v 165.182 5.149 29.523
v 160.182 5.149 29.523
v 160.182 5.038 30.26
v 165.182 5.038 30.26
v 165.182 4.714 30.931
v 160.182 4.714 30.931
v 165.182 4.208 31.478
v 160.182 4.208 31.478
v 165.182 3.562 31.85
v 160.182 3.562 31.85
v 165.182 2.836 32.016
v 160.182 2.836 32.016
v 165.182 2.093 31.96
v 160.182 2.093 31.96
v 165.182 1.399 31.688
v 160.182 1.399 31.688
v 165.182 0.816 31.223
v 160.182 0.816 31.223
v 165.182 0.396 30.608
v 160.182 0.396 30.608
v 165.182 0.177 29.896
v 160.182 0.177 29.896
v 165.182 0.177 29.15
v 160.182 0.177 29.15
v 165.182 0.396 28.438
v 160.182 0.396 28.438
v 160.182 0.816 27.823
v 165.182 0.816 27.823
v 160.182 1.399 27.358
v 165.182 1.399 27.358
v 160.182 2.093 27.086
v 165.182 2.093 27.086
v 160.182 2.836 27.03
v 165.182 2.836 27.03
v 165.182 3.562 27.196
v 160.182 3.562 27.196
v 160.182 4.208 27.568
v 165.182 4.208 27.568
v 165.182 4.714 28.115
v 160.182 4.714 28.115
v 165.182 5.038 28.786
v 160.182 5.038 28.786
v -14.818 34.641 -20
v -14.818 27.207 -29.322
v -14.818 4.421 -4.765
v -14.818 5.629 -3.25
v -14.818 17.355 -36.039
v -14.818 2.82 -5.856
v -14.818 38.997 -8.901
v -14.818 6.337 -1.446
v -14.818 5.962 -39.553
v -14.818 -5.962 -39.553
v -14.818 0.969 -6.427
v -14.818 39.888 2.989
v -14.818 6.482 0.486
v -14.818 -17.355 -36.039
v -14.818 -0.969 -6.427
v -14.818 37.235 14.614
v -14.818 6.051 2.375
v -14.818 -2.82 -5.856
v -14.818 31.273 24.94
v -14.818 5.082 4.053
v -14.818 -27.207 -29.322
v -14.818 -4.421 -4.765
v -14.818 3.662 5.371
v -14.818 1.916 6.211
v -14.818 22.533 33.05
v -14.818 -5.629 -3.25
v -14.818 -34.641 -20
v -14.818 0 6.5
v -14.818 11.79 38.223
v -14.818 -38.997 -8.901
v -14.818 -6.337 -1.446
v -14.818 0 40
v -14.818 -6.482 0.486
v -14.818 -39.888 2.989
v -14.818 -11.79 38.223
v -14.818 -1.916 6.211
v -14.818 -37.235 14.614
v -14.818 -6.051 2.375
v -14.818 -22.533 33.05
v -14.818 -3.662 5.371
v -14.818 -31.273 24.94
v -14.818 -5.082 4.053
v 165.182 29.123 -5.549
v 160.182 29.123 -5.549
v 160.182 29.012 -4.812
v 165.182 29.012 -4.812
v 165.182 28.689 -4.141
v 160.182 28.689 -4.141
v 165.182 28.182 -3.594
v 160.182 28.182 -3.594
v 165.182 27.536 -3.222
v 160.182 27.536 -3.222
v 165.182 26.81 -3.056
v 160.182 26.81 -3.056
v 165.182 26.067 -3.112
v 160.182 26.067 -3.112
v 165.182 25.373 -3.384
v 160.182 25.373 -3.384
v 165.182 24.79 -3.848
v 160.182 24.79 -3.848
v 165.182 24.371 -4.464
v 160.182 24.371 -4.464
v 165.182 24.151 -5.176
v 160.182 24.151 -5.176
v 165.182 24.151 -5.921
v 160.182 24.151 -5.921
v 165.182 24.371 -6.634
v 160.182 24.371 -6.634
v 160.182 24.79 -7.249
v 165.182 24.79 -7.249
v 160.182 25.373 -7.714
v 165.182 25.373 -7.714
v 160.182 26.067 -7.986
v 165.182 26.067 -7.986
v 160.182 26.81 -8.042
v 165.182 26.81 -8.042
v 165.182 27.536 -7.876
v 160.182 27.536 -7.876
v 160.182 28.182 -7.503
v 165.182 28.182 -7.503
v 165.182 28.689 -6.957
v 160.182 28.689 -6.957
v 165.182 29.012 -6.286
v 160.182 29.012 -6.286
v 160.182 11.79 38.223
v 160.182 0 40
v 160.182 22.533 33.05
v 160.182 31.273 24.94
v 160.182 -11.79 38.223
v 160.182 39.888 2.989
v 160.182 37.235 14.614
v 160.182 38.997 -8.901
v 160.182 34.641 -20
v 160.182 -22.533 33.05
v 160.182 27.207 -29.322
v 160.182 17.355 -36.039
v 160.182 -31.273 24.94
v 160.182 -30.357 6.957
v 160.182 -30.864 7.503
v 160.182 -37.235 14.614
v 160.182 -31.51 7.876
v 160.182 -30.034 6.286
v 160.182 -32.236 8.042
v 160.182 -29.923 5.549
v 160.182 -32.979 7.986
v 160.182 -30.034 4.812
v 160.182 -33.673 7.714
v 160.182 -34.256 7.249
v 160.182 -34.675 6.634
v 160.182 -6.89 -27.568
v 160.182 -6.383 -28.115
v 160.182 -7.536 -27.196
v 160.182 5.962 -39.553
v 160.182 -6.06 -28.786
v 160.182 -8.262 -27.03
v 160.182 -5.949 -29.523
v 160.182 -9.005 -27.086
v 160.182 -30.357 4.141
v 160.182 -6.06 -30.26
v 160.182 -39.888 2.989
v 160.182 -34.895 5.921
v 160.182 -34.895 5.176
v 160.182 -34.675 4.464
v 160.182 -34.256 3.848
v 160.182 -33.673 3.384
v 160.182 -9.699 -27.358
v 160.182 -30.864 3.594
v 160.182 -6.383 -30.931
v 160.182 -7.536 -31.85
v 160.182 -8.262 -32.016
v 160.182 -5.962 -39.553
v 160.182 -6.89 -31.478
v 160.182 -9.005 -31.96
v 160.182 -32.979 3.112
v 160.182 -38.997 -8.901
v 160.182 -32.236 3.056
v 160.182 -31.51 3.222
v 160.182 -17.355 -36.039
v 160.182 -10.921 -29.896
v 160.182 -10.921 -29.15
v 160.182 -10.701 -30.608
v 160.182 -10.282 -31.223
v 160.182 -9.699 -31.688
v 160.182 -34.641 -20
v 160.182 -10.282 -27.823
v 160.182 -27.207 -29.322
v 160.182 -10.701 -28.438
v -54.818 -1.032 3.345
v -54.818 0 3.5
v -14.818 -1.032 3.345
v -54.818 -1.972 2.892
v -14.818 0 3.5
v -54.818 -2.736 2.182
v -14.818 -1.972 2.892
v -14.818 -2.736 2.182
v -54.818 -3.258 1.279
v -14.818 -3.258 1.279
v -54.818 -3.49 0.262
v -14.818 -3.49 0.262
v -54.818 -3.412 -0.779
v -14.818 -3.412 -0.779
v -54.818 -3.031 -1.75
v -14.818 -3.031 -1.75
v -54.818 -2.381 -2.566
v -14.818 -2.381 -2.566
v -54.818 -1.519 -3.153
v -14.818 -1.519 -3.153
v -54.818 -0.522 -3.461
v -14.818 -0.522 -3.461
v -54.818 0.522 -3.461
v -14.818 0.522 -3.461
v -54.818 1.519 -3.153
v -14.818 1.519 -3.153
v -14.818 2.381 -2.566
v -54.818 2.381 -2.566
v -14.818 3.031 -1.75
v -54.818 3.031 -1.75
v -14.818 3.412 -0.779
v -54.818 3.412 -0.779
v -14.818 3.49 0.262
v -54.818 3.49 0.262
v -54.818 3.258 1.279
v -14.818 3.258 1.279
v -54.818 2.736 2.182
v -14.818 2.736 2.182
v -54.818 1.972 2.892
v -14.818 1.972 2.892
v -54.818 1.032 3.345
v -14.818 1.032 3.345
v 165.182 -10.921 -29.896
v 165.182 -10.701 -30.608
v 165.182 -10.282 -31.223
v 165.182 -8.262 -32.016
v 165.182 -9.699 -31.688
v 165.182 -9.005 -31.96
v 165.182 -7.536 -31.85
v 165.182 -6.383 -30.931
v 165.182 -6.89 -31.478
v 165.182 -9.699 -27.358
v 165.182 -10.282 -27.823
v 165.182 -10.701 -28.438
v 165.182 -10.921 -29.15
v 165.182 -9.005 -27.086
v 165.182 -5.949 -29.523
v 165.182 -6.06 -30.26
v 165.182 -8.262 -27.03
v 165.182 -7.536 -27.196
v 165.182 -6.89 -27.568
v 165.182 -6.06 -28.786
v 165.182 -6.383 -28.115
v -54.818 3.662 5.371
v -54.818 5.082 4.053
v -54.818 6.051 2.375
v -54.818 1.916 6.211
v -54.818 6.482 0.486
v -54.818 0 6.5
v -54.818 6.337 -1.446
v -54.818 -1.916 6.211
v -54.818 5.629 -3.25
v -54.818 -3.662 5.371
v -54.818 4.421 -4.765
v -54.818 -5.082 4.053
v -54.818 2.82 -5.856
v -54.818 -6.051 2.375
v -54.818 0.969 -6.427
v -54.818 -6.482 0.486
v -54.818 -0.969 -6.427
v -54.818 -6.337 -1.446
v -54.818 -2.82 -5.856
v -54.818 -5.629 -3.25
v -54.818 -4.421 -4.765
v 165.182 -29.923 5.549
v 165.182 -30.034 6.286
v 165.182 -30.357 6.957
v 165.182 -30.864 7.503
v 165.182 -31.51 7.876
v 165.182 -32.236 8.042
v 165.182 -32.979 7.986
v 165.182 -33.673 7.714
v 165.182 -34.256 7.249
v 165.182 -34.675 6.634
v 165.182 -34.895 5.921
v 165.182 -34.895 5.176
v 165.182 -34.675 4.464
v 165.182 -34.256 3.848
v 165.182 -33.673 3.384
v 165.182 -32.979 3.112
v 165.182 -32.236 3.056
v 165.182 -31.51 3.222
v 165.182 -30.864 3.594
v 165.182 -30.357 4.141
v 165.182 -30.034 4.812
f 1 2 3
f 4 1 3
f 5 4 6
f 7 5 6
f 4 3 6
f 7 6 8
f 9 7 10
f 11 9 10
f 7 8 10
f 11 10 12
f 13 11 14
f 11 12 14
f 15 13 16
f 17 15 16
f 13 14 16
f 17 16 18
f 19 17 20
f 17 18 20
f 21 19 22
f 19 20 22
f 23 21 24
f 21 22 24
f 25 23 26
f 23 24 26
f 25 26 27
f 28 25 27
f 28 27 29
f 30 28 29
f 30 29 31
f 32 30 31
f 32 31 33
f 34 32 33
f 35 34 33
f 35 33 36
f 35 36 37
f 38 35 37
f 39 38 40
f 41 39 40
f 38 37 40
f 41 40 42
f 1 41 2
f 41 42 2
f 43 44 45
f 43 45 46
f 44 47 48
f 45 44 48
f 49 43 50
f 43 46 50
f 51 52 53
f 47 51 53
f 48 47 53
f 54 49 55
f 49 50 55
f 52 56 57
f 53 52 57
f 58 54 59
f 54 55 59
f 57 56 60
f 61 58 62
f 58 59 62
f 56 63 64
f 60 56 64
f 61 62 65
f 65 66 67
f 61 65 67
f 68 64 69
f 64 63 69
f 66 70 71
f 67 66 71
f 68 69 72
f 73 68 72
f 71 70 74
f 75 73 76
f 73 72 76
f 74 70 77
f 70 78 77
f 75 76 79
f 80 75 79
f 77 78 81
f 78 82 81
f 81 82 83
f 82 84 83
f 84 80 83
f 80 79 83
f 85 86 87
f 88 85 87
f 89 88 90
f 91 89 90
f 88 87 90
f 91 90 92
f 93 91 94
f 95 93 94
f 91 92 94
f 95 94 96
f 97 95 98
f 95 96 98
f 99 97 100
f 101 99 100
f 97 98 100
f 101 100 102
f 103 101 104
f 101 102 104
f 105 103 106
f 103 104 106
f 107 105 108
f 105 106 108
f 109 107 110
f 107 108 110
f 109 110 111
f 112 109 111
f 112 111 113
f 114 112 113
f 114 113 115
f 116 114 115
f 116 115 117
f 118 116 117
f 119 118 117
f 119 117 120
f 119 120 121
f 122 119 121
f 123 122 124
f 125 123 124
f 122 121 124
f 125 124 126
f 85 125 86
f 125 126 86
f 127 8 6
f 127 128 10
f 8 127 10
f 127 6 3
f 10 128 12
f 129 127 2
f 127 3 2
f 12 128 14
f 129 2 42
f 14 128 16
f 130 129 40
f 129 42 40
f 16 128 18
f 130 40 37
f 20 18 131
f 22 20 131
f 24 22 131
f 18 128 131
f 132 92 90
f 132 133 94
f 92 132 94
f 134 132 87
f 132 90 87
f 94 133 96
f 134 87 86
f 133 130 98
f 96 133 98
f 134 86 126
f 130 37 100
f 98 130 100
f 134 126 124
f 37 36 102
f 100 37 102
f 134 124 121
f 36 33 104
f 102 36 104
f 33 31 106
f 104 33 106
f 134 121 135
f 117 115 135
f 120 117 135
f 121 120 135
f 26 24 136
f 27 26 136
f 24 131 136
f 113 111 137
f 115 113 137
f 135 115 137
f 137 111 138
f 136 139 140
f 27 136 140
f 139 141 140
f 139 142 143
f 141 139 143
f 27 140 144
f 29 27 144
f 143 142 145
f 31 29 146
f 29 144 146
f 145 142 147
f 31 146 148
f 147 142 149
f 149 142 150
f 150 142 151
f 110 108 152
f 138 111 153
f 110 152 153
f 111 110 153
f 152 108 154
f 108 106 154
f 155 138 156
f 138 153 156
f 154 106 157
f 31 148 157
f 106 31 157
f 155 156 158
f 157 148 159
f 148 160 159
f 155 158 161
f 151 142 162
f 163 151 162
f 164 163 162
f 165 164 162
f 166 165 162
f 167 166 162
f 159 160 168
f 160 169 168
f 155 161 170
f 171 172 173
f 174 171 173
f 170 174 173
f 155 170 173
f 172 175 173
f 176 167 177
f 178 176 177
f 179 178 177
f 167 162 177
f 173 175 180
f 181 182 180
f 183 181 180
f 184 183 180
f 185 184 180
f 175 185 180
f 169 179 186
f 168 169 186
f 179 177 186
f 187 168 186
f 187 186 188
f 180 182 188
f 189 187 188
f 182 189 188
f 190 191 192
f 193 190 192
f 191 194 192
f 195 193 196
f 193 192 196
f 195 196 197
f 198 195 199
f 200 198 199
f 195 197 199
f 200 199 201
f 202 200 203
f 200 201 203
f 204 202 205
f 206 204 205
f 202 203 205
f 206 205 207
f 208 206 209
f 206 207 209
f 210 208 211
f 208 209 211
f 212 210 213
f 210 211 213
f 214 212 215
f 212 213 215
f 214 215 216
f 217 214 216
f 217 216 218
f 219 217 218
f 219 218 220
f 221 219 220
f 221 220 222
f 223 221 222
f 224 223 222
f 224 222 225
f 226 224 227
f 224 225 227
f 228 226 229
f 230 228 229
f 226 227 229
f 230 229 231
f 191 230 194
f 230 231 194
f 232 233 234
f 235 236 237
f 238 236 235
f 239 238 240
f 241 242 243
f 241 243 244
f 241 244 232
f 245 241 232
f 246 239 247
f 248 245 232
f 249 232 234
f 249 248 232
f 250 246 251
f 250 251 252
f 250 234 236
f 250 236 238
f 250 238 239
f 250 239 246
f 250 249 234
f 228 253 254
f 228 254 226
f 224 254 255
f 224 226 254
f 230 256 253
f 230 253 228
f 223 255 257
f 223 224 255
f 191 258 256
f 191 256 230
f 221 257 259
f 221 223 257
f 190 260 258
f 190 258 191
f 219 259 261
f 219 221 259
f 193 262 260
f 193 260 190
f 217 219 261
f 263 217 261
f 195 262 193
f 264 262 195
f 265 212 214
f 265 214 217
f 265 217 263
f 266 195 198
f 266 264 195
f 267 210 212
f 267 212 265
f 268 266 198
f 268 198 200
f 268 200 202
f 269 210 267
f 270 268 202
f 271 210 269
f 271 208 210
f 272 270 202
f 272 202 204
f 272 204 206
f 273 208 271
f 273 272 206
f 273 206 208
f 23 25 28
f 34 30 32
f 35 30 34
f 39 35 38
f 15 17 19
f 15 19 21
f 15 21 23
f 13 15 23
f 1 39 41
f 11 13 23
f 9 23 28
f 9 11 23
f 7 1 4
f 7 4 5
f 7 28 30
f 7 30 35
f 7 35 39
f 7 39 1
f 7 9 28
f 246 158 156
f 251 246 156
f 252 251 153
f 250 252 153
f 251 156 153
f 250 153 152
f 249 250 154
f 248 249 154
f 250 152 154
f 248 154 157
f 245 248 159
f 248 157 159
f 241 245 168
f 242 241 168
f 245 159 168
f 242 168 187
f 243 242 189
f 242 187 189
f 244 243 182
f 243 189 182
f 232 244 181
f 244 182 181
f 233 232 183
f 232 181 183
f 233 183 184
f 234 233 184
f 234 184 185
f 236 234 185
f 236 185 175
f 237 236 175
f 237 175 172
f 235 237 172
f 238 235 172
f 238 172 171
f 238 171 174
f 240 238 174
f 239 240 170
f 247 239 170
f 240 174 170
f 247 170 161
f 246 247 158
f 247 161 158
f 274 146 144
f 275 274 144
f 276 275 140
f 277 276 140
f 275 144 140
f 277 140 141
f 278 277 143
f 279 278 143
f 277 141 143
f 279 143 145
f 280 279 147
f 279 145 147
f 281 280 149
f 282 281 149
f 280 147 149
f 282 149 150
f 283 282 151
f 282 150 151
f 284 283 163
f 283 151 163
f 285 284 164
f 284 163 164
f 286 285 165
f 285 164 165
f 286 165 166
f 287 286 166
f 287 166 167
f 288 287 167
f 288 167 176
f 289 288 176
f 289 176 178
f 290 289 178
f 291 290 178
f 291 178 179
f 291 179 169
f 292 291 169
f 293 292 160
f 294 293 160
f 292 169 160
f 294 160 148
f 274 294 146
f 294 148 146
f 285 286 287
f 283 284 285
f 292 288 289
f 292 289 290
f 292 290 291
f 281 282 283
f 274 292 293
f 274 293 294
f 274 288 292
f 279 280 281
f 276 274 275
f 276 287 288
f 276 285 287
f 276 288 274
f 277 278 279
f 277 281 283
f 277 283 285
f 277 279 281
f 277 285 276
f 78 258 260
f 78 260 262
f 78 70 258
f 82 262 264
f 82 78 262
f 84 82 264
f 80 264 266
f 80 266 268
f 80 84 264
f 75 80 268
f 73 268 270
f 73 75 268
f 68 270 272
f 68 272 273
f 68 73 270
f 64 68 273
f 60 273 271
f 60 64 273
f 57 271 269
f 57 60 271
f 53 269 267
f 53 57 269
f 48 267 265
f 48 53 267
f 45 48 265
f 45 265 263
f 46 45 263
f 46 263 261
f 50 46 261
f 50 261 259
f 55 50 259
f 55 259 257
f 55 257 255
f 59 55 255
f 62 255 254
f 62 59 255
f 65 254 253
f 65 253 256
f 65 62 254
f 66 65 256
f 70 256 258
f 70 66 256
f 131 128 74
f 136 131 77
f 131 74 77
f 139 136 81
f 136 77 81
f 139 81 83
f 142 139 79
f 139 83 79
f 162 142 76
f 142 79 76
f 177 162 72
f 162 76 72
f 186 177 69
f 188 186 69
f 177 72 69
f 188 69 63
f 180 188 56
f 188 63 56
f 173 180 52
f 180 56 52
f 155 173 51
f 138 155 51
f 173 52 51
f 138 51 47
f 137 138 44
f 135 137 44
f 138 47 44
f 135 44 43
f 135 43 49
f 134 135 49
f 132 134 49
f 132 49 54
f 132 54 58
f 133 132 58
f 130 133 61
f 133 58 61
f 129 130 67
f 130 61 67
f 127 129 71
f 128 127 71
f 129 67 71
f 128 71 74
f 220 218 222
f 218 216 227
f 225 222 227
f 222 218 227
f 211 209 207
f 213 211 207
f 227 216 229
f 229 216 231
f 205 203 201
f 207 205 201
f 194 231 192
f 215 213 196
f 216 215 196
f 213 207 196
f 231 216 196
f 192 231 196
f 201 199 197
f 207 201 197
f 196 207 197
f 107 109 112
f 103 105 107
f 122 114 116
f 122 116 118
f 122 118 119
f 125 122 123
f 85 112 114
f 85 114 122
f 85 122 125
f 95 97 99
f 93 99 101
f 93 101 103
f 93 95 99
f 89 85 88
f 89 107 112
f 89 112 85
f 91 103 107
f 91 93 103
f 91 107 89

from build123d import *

# Parameters (mm, degrees)
F0_W     = 40
F0_H     = 3
F2_R     = 2.5
F3_DEPTH = 5


with BuildPart() as f1:
    # F0 (on Front) → F1 (revolve)
    with BuildSketch(Plane.XZ):
        with Locations((-34.818123, 5)):
            Rectangle(F0_W, F0_H)
        Polygon((-14.818123, 3.5), (-14.818123, 0), (160.181877, 0), (160.181877, 40), (-14.818123, 40), (-14.818123, 6.5), align=None)
    revolve(axis=Axis((18.749876, 0, 0), (1, 0, 0)))

    # F2 (on face) → F3 (join)
    with BuildSketch(Plane.YZ.offset(160.181877)):
        with Locations((2.648871, 29.522968)):
            Circle(F2_R)
        with Locations((-8.448871, -29.522968)):
            Circle(F2_R)
        with Locations((26.622968, -5.548871)):
            Circle(F2_R)
        with Locations((-32.422968, 5.548871)):
            Circle(F2_R)
    extrude(amount=F3_DEPTH)


solid = f1.part
